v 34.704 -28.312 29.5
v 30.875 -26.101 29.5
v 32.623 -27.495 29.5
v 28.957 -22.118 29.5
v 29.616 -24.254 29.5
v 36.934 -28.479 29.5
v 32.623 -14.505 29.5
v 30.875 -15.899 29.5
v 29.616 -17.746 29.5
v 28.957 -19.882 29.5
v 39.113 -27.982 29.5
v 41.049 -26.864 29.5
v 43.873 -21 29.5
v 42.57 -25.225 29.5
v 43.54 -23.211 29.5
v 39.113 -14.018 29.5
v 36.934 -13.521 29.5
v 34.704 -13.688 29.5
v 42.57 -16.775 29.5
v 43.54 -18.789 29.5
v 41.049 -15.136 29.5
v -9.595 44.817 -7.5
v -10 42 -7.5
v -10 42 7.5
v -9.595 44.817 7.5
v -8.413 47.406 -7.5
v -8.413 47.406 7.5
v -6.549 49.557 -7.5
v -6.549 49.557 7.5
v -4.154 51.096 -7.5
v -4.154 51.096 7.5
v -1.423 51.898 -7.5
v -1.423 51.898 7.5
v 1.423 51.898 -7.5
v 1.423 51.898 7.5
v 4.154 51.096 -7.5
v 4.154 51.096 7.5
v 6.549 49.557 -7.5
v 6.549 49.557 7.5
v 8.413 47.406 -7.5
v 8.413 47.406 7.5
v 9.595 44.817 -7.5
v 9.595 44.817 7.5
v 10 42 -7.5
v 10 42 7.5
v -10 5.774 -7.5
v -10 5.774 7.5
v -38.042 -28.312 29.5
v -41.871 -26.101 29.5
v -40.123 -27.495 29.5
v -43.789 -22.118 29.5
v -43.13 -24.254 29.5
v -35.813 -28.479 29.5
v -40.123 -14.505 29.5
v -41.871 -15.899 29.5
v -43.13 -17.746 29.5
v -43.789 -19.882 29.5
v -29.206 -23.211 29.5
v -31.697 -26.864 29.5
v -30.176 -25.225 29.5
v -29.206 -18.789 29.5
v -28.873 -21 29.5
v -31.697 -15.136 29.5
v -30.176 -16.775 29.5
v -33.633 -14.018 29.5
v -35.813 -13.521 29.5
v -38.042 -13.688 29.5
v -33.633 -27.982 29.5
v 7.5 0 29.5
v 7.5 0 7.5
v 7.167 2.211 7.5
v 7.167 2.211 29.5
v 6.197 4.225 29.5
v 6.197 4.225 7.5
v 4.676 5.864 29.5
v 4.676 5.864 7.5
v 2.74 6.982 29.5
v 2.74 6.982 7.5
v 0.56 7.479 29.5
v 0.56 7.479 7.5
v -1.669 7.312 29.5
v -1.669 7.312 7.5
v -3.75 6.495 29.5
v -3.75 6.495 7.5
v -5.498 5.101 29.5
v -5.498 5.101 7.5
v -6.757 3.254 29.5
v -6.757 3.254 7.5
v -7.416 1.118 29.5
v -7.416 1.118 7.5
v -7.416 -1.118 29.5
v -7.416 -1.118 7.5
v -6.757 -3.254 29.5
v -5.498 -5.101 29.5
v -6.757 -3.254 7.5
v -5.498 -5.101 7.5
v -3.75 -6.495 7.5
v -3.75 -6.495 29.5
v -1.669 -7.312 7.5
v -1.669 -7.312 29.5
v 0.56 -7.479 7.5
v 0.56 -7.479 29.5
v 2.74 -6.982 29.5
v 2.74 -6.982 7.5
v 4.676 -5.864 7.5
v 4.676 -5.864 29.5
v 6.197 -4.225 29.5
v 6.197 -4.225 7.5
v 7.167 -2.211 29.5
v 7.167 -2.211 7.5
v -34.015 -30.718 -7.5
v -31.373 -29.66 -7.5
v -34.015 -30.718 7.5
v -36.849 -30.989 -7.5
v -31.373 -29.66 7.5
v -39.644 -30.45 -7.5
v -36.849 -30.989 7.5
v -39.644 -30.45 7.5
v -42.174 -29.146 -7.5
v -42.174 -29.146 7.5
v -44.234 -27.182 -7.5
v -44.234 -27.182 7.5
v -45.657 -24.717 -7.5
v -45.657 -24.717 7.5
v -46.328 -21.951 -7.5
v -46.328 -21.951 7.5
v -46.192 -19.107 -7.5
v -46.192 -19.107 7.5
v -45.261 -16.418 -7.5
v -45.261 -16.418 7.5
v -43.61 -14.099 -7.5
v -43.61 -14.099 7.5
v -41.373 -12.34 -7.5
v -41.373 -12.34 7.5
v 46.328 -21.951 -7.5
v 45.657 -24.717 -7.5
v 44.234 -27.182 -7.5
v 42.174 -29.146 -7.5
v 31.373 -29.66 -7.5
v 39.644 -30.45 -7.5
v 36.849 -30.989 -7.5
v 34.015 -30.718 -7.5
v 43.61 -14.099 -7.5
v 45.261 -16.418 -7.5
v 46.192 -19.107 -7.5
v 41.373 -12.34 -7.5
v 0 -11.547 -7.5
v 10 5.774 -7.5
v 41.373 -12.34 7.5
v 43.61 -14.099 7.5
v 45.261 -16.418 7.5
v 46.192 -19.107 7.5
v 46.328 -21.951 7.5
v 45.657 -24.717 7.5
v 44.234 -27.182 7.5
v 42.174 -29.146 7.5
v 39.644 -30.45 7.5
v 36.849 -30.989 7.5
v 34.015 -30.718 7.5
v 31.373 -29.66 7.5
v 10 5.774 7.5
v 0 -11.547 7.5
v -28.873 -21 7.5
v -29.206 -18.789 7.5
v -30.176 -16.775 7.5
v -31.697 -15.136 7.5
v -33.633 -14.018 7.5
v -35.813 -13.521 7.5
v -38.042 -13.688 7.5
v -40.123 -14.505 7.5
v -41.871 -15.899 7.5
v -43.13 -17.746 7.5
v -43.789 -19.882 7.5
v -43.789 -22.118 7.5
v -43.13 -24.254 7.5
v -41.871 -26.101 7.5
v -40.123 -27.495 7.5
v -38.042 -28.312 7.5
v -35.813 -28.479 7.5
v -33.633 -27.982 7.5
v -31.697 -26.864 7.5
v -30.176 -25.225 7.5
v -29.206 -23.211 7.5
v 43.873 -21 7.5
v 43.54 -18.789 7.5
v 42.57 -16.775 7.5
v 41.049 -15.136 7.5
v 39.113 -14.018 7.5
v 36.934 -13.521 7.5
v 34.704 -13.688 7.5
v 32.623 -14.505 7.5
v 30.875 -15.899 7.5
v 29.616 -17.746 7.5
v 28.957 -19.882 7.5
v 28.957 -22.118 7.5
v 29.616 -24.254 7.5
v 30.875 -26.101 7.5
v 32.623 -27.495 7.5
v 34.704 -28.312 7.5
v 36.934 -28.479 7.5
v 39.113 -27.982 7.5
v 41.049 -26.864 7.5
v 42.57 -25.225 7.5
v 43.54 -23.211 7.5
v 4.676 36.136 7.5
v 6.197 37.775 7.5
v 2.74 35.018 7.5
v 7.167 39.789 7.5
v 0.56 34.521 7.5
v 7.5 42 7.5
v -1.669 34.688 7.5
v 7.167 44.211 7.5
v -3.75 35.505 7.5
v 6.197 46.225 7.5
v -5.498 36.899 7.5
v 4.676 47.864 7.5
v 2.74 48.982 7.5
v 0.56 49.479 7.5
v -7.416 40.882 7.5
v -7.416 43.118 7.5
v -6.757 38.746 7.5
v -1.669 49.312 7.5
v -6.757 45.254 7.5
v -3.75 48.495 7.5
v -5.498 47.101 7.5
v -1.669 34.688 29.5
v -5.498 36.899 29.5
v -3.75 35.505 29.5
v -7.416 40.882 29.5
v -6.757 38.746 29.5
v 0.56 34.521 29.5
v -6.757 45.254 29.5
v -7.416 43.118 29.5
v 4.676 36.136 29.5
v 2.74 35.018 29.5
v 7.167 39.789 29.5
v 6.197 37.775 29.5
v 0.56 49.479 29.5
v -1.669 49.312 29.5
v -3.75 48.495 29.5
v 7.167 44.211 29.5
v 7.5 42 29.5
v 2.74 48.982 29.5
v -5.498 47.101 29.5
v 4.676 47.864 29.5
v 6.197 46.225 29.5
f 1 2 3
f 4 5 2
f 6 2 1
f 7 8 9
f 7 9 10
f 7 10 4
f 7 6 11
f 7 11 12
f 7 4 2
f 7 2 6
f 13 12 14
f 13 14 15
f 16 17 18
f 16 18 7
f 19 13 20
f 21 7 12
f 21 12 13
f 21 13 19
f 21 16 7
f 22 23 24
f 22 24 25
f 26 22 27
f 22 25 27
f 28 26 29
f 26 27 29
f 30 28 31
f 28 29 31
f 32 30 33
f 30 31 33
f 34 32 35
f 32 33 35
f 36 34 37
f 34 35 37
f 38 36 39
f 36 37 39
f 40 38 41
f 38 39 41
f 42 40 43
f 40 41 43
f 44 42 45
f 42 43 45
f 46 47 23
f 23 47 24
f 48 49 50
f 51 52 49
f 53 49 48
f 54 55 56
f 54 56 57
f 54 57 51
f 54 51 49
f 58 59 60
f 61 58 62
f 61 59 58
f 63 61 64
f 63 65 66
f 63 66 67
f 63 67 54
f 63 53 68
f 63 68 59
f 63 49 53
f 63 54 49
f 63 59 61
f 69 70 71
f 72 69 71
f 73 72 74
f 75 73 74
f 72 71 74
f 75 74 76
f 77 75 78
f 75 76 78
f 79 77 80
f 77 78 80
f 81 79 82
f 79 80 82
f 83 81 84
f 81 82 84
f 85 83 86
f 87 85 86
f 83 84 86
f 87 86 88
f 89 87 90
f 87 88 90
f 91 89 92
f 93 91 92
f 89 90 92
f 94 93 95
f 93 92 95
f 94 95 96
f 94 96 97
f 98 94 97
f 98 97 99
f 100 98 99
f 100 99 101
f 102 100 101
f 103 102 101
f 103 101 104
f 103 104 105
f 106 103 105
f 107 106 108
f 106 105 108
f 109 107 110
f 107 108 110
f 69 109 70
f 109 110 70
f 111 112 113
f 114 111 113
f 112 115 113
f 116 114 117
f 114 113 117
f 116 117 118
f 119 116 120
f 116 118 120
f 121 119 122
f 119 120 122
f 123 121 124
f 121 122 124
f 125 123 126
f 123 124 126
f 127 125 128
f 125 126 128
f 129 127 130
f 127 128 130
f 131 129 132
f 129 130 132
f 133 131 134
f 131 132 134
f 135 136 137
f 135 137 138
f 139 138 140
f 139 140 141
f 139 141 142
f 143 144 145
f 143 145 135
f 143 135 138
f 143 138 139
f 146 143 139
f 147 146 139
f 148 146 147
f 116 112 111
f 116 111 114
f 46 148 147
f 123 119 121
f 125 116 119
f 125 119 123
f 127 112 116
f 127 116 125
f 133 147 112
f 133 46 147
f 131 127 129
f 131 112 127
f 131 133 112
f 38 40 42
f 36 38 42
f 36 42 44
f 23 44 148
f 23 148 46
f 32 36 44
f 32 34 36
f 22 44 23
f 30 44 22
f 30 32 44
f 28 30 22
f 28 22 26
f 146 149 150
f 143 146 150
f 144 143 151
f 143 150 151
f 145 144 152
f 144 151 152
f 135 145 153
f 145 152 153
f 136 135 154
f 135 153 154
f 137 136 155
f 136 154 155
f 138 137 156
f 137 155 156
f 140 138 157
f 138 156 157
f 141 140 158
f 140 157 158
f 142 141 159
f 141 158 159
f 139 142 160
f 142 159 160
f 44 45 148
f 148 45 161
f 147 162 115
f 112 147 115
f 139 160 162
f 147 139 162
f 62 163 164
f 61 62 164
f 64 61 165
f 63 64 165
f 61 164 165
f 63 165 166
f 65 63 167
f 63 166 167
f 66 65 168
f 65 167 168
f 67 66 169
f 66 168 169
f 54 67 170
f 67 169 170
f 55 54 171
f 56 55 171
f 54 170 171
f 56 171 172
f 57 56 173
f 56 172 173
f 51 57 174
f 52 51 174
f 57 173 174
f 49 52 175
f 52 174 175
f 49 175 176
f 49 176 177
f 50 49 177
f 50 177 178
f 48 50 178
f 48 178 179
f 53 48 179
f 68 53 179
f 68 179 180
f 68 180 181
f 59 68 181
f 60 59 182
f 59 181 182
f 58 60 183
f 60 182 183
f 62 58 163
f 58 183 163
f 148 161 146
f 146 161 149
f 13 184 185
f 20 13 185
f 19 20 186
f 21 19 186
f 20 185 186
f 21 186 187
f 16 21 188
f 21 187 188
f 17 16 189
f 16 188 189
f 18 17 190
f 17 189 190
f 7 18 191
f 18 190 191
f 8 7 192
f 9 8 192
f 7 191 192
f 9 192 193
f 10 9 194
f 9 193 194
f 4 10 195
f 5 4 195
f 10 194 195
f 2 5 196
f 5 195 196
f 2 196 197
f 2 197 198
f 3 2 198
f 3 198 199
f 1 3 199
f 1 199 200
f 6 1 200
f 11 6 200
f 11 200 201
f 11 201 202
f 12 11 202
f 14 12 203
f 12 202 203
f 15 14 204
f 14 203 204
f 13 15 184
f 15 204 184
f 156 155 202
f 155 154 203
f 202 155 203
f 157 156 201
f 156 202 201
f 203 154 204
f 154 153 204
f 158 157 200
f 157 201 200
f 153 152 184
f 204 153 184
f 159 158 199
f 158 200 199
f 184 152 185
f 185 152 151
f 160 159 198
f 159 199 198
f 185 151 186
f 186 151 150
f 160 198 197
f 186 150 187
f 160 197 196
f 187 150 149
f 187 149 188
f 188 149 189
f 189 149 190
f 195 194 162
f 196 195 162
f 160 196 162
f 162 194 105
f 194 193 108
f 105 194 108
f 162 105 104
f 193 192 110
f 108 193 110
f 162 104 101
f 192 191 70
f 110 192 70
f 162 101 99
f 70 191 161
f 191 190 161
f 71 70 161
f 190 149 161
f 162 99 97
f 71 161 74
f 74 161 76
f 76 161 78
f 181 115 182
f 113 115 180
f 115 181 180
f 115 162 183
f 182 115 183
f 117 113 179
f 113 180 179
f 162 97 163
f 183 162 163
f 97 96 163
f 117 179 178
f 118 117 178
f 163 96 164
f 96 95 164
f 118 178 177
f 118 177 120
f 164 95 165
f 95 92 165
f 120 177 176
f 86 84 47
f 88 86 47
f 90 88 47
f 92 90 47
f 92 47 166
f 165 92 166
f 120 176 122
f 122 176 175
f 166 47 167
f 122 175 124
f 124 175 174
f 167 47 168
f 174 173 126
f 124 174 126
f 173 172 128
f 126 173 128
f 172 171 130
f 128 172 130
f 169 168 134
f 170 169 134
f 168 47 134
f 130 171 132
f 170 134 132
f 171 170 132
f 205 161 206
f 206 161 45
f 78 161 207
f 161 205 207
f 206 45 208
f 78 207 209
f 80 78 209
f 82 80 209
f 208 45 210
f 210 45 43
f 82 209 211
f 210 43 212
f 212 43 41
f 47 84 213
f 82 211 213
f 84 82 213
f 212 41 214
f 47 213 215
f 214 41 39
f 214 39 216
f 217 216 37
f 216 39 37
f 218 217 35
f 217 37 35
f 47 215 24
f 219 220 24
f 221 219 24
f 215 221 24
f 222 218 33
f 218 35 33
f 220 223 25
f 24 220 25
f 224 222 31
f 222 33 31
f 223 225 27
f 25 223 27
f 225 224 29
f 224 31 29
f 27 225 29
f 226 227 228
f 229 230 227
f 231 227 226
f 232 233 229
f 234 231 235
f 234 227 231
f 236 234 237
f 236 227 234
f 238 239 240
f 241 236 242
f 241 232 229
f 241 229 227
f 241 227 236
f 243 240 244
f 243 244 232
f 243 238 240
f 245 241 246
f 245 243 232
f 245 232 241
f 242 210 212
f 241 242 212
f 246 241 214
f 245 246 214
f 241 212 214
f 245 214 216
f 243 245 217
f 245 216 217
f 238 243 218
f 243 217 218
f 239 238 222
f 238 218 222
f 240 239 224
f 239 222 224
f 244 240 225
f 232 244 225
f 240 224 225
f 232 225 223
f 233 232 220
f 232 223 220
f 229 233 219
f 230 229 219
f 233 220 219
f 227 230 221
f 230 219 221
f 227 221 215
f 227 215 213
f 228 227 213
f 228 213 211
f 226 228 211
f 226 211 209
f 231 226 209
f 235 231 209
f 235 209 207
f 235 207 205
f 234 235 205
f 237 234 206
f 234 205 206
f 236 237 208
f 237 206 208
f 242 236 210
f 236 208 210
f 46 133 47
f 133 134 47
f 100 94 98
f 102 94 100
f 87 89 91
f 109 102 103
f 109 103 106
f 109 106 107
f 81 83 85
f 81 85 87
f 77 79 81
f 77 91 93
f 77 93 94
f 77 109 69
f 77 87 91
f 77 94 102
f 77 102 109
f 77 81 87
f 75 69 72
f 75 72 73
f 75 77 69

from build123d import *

# Parameters (mm, degrees)
CARRIER_BASE_DEPTH  = 7.5
SKETCH3_R           = 7.5
PLANET_SHAFTS_DEPTH = 22
SKETCH4_R           = 7.5
SUN_SHAFT_DEPTH     = 22


with BuildPart() as part:
    # Sketch1 → Carrier Base (new, symmetric)
    with BuildSketch(Plane.XY):
        with BuildLine():
            Line((0, -11.547005384), (-31.373066961, -29.660254039))
            ThreePointArc((-31.373066961, -29.660254039), (-45.033320997, -26), (-41.373066961, -12.339745963))
            Line((-41.373066961, -12.339745963), (-10, 5.773502692))
            Line((-10, 5.773502692), (-10, 42.000000002))
            ThreePointArc((-10, 42.000000002), (0, 52), (10, 42.000000002))
            Line((10, 42.000000002), (10, 5.773502692))
            Line((10, 5.773502692), (41.373066961, -12.339745963))
            ThreePointArc((41.373066961, -12.339745963), (45.033320997, -26), (31.373066961, -29.660254039))
            Line((31.373066961, -29.660254039), (0, -11.547005384))
        make_face()
    extrude(amount=CARRIER_BASE_DEPTH, both=True)

    # Sketch3 → Planet Shafts (add)
    with BuildSketch(Plane.XY.offset(7.5)):
        with Locations((0, 42)):
            Circle(SKETCH3_R)
        with Locations((36.373066959, -21)):
            Circle(SKETCH3_R)
        with Locations((-36.373066959, -21)):
            Circle(SKETCH3_R)
    extrude(amount=PLANET_SHAFTS_DEPTH)

    # Sketch4 → Sun Shaft (add)
    with BuildSketch(Plane.XY.offset(7.5)):
        Circle(SKETCH4_R)
    extrude(amount=SUN_SHAFT_DEPTH)


solid = part.part
